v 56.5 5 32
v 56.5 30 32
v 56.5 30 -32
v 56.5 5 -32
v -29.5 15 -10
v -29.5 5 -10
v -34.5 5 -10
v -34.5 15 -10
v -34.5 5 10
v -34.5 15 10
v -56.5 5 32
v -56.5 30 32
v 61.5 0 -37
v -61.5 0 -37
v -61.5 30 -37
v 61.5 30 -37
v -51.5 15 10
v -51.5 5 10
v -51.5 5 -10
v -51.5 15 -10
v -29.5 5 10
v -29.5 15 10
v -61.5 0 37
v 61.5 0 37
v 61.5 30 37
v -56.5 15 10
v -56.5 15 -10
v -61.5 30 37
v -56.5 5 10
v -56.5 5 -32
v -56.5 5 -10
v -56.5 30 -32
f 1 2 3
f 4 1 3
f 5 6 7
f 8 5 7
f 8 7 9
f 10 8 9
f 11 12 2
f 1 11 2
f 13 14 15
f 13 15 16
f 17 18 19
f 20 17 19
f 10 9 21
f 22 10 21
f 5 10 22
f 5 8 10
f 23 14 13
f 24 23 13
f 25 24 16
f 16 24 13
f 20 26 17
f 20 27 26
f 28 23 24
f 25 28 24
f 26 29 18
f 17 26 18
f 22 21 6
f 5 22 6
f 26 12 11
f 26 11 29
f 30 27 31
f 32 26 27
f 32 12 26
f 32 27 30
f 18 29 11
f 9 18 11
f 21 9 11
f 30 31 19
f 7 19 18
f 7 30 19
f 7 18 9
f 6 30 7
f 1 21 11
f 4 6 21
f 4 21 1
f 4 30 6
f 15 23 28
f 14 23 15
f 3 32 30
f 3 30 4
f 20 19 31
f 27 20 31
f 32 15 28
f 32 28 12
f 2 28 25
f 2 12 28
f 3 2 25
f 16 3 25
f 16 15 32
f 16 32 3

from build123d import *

# Parameters (mm, degrees)
SKETCH1_W           = 123
SKETCH1_H           = 74
BOSS_EXTRUDE1_DEPTH = 30
SKETCH2_W           = 113
SKETCH2_H           = 64
CUT_EXTRUDE1_DEPTH  = 25
BOSS_EXTRUDE2_DEPTH = 10
LPATTERN1_COUNT     = 2
LPATTERN1_PITCH     = 22


with BuildPart() as part:
    # Sketch1 → Boss-Extrude1 (new body)
    with BuildSketch(Plane(origin=(0, 0, 0), x_dir=(1, 0, 0), z_dir=(0, 1, 0))):
        Rectangle(SKETCH1_W, SKETCH1_H)
    extrude(amount=BOSS_EXTRUDE1_DEPTH)

    # Sketch2 → Cut-Extrude1 (cut)
    with BuildSketch(Plane(origin=(0, 30, 0), x_dir=(1, 0, 0), z_dir=(0, 1, 0))):
        Rectangle(SKETCH2_W, SKETCH2_H)
    extrude(amount=-CUT_EXTRUDE1_DEPTH, mode=Mode.SUBTRACT)

    # Sketch4 → Boss-Extrude2 (add)
    with BuildSketch(Plane(origin=(0, 5, 0), x_dir=(1, 0, 0), z_dir=(0, 1, 0))):
        Polygon((-56.5, -10), (-51.5, -10), (-51.5, 10), (-56.5, 10), (-56.5, 0), align=None)
    boss_extrude2 = extrude(amount=BOSS_EXTRUDE2_DEPTH)

    # LPattern1: Boss-Extrude2 ×2
    with Locations(*[(i * LPATTERN1_PITCH, 0, 0) for i in range(1, LPATTERN1_COUNT)]):
        add(boss_extrude2)


solid = part.part
